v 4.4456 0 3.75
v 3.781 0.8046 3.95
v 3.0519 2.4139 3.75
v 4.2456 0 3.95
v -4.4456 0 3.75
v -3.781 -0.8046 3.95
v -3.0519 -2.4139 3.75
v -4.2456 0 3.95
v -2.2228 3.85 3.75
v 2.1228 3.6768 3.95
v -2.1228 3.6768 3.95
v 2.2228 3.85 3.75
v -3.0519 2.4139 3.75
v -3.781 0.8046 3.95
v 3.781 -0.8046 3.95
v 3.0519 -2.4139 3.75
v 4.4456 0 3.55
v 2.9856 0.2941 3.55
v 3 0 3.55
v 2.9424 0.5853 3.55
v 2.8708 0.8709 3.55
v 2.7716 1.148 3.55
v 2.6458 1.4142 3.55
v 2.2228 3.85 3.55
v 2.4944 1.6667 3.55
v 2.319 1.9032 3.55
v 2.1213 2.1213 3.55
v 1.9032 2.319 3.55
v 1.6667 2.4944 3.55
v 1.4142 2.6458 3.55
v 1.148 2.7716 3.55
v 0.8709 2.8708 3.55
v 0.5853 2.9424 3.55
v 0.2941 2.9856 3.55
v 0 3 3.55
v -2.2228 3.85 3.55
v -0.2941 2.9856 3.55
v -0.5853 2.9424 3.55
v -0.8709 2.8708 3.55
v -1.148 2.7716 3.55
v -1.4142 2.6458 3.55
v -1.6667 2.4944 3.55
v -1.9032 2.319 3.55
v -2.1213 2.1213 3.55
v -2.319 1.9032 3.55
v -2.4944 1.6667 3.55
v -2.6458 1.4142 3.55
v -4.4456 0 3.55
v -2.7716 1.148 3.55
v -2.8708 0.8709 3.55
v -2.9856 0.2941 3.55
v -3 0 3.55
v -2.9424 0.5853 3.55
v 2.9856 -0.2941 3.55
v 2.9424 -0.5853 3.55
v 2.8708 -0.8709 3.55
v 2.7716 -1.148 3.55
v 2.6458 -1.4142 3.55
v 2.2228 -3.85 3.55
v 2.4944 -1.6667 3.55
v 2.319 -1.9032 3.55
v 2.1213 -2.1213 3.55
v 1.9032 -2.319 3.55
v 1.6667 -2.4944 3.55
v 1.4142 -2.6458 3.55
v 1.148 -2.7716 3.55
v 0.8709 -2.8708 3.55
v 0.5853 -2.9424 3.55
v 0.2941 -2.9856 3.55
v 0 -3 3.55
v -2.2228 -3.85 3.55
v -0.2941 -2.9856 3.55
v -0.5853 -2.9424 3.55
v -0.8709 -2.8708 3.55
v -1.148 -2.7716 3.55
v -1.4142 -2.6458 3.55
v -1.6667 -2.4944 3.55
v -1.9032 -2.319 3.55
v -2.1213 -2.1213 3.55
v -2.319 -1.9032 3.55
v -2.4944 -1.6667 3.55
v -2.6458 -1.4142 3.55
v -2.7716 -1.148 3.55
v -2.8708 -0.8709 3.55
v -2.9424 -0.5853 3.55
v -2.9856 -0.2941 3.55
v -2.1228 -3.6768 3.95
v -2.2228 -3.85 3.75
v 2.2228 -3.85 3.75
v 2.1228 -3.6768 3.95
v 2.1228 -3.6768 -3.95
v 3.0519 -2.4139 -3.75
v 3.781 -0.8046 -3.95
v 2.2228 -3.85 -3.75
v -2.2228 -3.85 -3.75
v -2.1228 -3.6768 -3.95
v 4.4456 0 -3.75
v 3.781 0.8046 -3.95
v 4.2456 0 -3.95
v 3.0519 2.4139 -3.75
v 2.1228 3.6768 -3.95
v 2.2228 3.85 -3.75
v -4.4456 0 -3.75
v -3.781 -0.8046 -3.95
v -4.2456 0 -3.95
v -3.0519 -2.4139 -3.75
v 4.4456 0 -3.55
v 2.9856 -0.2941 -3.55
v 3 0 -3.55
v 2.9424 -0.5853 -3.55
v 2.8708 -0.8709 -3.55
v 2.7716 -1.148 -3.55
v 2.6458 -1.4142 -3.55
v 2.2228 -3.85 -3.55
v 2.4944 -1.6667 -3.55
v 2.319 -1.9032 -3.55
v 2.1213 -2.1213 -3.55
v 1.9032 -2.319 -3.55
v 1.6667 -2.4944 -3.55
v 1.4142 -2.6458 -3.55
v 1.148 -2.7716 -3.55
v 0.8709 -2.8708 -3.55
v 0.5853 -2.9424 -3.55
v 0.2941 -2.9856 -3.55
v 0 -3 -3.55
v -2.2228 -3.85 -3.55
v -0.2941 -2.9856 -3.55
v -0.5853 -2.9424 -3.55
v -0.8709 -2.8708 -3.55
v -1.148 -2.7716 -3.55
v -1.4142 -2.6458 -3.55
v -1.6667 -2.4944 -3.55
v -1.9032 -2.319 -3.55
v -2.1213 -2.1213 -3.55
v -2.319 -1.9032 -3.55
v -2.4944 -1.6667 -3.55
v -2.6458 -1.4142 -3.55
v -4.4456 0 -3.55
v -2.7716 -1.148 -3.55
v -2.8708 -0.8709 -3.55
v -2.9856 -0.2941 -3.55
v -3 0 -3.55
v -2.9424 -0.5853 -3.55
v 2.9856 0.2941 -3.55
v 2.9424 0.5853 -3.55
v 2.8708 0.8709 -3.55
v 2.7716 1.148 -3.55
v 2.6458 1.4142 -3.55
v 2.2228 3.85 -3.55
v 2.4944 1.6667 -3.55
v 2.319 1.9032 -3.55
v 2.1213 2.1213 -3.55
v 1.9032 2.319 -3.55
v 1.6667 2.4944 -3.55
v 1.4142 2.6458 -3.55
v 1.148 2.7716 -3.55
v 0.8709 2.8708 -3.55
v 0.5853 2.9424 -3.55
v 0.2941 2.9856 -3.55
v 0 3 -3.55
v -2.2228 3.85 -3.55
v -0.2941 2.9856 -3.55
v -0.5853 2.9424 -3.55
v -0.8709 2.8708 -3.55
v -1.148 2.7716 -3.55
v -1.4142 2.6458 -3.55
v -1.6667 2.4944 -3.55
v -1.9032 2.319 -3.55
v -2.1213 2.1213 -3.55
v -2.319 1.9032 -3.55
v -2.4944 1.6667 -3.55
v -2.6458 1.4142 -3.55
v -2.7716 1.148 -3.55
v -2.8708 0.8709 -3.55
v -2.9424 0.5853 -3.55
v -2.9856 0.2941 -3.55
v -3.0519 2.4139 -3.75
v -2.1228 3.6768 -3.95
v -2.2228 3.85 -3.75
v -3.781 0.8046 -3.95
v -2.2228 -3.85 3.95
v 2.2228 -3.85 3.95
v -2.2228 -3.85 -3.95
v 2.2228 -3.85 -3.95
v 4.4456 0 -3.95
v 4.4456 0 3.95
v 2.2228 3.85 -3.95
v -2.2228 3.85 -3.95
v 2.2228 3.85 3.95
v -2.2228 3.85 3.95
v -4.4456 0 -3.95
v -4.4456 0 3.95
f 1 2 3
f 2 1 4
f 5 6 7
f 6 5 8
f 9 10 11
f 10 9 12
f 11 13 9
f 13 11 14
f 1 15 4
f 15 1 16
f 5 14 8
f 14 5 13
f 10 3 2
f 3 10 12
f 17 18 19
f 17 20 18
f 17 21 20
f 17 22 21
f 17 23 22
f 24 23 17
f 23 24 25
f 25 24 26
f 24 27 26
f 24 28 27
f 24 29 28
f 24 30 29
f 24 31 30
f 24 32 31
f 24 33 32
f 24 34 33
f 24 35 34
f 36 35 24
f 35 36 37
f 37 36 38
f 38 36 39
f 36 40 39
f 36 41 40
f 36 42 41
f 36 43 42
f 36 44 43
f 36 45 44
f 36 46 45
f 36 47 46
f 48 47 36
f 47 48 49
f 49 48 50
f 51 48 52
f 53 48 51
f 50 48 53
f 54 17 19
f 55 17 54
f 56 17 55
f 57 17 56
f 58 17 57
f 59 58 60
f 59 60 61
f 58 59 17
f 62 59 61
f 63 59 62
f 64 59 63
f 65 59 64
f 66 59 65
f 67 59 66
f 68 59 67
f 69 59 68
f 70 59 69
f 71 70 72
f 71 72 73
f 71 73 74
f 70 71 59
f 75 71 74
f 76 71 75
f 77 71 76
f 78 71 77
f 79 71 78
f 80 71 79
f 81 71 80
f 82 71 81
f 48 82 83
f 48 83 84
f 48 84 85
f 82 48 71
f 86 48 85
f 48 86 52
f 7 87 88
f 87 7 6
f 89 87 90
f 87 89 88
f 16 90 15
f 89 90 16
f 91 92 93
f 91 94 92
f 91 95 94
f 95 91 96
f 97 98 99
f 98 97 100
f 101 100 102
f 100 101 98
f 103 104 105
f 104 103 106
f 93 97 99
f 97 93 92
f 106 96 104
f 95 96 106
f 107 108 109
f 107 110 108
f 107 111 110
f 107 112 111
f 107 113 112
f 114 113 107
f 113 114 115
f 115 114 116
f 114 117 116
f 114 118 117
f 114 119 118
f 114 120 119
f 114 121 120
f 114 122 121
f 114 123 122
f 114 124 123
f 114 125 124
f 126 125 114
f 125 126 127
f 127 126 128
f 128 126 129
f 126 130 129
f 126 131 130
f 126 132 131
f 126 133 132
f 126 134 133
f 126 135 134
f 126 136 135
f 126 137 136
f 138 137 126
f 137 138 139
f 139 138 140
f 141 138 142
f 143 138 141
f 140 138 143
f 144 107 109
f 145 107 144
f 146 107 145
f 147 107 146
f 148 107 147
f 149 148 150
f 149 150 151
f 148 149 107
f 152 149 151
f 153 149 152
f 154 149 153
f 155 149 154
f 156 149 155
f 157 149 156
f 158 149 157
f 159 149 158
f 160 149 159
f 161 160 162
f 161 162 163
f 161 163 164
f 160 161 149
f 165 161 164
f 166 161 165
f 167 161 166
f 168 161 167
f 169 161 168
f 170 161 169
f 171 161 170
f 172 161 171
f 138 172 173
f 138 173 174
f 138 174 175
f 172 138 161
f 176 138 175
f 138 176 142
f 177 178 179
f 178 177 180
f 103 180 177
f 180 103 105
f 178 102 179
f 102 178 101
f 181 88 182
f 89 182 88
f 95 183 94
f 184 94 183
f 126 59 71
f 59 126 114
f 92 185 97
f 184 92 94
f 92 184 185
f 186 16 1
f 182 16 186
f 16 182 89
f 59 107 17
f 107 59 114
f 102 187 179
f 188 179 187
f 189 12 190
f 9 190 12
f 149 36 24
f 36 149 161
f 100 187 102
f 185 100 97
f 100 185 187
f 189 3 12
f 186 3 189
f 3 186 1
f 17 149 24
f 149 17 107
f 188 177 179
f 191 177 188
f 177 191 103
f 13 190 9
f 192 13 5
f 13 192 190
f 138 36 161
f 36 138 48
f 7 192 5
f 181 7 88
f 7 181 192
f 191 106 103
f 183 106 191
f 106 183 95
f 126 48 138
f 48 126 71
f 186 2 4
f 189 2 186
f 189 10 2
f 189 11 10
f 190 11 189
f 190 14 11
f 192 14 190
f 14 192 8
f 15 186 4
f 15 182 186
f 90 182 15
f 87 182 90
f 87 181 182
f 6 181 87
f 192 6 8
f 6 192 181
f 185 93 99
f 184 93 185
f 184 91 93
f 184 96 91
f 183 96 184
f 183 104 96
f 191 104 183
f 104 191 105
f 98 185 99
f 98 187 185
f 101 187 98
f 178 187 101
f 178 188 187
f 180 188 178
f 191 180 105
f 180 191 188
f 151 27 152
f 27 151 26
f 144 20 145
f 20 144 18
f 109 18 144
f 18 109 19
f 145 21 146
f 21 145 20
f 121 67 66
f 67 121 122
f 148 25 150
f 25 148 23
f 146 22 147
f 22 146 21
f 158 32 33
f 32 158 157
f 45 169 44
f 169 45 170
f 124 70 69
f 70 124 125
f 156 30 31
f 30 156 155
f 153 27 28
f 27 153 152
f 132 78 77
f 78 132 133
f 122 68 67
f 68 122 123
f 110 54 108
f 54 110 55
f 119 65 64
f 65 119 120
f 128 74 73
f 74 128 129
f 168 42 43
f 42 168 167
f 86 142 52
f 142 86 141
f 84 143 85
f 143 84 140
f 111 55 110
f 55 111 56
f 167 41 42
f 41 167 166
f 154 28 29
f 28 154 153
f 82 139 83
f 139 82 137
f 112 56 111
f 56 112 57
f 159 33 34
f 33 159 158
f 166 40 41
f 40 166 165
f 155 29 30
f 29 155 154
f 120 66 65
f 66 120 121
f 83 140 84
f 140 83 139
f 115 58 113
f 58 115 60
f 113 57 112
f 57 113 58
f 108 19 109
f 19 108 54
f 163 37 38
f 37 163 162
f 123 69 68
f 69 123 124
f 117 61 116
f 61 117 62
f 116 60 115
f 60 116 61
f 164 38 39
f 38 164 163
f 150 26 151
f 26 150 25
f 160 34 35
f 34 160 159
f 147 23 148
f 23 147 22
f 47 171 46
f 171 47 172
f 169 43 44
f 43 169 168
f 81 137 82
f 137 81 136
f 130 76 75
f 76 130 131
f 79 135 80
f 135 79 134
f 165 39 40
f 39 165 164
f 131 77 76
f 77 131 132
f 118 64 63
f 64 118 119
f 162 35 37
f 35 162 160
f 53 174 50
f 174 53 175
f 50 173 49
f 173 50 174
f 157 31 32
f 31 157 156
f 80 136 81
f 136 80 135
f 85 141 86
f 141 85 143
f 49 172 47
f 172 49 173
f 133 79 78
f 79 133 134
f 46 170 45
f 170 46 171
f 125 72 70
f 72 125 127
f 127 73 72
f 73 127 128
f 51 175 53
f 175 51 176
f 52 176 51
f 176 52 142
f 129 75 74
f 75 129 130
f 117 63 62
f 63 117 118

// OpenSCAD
// Plain hex nut (no flange/washer)
// Target: M6 clearance hole, 7.7mm across flats, 7.9mm thick

thread_nominal_diameter_mm = 6;      //[3:12:0.1]
across_flats_mm = 7.7;               //[3.85:15.4:0.1]
thickness_mm = 7.9;                  //[3.95:15.8:0.1]
clearance_diameter_mm = 6;           //[3:12:0.1]
chamfer_mm = 0.3;                    //[0.0:1:0.05]
overlap_mm = 0.2;                    //[0.05:1:0.05]

// Derived
hex_R = across_flats_mm / (2 * cos(30)); // circumradius for $fn=6 cylinder

module hex_nut_plain() {
    difference() {
        // Outer hex body
        cylinder(r=hex_R, h=thickness_mm, center=true, $fn=6);

        // Through hole (clearance)
        cylinder(r=clearance_diameter_mm/2, h=thickness_mm + 2*overlap_mm, center=true, $fn=64);

        // Optional chamfers on both faces (kept small; does not add flange)
        if (chamfer_mm > 0) {
            // Top chamfer cut
            translate([0, 0, thickness_mm/2 - chamfer_mm/2])
                cylinder(
                    r1=hex_R + overlap_mm,
                    r2=hex_R - chamfer_mm,
                    h=chamfer_mm + overlap_mm,
                    center=true,
                    $fn=6
                );

            // Bottom chamfer cut
            translate([0, 0, -thickness_mm/2 + chamfer_mm/2])
                cylinder(
                    r1=hex_R - chamfer_mm,
                    r2=hex_R + overlap_mm,
                    h=chamfer_mm + overlap_mm,
                    center=true,
                    $fn=6
                );
        }
    }
}

hex_nut_plain();
